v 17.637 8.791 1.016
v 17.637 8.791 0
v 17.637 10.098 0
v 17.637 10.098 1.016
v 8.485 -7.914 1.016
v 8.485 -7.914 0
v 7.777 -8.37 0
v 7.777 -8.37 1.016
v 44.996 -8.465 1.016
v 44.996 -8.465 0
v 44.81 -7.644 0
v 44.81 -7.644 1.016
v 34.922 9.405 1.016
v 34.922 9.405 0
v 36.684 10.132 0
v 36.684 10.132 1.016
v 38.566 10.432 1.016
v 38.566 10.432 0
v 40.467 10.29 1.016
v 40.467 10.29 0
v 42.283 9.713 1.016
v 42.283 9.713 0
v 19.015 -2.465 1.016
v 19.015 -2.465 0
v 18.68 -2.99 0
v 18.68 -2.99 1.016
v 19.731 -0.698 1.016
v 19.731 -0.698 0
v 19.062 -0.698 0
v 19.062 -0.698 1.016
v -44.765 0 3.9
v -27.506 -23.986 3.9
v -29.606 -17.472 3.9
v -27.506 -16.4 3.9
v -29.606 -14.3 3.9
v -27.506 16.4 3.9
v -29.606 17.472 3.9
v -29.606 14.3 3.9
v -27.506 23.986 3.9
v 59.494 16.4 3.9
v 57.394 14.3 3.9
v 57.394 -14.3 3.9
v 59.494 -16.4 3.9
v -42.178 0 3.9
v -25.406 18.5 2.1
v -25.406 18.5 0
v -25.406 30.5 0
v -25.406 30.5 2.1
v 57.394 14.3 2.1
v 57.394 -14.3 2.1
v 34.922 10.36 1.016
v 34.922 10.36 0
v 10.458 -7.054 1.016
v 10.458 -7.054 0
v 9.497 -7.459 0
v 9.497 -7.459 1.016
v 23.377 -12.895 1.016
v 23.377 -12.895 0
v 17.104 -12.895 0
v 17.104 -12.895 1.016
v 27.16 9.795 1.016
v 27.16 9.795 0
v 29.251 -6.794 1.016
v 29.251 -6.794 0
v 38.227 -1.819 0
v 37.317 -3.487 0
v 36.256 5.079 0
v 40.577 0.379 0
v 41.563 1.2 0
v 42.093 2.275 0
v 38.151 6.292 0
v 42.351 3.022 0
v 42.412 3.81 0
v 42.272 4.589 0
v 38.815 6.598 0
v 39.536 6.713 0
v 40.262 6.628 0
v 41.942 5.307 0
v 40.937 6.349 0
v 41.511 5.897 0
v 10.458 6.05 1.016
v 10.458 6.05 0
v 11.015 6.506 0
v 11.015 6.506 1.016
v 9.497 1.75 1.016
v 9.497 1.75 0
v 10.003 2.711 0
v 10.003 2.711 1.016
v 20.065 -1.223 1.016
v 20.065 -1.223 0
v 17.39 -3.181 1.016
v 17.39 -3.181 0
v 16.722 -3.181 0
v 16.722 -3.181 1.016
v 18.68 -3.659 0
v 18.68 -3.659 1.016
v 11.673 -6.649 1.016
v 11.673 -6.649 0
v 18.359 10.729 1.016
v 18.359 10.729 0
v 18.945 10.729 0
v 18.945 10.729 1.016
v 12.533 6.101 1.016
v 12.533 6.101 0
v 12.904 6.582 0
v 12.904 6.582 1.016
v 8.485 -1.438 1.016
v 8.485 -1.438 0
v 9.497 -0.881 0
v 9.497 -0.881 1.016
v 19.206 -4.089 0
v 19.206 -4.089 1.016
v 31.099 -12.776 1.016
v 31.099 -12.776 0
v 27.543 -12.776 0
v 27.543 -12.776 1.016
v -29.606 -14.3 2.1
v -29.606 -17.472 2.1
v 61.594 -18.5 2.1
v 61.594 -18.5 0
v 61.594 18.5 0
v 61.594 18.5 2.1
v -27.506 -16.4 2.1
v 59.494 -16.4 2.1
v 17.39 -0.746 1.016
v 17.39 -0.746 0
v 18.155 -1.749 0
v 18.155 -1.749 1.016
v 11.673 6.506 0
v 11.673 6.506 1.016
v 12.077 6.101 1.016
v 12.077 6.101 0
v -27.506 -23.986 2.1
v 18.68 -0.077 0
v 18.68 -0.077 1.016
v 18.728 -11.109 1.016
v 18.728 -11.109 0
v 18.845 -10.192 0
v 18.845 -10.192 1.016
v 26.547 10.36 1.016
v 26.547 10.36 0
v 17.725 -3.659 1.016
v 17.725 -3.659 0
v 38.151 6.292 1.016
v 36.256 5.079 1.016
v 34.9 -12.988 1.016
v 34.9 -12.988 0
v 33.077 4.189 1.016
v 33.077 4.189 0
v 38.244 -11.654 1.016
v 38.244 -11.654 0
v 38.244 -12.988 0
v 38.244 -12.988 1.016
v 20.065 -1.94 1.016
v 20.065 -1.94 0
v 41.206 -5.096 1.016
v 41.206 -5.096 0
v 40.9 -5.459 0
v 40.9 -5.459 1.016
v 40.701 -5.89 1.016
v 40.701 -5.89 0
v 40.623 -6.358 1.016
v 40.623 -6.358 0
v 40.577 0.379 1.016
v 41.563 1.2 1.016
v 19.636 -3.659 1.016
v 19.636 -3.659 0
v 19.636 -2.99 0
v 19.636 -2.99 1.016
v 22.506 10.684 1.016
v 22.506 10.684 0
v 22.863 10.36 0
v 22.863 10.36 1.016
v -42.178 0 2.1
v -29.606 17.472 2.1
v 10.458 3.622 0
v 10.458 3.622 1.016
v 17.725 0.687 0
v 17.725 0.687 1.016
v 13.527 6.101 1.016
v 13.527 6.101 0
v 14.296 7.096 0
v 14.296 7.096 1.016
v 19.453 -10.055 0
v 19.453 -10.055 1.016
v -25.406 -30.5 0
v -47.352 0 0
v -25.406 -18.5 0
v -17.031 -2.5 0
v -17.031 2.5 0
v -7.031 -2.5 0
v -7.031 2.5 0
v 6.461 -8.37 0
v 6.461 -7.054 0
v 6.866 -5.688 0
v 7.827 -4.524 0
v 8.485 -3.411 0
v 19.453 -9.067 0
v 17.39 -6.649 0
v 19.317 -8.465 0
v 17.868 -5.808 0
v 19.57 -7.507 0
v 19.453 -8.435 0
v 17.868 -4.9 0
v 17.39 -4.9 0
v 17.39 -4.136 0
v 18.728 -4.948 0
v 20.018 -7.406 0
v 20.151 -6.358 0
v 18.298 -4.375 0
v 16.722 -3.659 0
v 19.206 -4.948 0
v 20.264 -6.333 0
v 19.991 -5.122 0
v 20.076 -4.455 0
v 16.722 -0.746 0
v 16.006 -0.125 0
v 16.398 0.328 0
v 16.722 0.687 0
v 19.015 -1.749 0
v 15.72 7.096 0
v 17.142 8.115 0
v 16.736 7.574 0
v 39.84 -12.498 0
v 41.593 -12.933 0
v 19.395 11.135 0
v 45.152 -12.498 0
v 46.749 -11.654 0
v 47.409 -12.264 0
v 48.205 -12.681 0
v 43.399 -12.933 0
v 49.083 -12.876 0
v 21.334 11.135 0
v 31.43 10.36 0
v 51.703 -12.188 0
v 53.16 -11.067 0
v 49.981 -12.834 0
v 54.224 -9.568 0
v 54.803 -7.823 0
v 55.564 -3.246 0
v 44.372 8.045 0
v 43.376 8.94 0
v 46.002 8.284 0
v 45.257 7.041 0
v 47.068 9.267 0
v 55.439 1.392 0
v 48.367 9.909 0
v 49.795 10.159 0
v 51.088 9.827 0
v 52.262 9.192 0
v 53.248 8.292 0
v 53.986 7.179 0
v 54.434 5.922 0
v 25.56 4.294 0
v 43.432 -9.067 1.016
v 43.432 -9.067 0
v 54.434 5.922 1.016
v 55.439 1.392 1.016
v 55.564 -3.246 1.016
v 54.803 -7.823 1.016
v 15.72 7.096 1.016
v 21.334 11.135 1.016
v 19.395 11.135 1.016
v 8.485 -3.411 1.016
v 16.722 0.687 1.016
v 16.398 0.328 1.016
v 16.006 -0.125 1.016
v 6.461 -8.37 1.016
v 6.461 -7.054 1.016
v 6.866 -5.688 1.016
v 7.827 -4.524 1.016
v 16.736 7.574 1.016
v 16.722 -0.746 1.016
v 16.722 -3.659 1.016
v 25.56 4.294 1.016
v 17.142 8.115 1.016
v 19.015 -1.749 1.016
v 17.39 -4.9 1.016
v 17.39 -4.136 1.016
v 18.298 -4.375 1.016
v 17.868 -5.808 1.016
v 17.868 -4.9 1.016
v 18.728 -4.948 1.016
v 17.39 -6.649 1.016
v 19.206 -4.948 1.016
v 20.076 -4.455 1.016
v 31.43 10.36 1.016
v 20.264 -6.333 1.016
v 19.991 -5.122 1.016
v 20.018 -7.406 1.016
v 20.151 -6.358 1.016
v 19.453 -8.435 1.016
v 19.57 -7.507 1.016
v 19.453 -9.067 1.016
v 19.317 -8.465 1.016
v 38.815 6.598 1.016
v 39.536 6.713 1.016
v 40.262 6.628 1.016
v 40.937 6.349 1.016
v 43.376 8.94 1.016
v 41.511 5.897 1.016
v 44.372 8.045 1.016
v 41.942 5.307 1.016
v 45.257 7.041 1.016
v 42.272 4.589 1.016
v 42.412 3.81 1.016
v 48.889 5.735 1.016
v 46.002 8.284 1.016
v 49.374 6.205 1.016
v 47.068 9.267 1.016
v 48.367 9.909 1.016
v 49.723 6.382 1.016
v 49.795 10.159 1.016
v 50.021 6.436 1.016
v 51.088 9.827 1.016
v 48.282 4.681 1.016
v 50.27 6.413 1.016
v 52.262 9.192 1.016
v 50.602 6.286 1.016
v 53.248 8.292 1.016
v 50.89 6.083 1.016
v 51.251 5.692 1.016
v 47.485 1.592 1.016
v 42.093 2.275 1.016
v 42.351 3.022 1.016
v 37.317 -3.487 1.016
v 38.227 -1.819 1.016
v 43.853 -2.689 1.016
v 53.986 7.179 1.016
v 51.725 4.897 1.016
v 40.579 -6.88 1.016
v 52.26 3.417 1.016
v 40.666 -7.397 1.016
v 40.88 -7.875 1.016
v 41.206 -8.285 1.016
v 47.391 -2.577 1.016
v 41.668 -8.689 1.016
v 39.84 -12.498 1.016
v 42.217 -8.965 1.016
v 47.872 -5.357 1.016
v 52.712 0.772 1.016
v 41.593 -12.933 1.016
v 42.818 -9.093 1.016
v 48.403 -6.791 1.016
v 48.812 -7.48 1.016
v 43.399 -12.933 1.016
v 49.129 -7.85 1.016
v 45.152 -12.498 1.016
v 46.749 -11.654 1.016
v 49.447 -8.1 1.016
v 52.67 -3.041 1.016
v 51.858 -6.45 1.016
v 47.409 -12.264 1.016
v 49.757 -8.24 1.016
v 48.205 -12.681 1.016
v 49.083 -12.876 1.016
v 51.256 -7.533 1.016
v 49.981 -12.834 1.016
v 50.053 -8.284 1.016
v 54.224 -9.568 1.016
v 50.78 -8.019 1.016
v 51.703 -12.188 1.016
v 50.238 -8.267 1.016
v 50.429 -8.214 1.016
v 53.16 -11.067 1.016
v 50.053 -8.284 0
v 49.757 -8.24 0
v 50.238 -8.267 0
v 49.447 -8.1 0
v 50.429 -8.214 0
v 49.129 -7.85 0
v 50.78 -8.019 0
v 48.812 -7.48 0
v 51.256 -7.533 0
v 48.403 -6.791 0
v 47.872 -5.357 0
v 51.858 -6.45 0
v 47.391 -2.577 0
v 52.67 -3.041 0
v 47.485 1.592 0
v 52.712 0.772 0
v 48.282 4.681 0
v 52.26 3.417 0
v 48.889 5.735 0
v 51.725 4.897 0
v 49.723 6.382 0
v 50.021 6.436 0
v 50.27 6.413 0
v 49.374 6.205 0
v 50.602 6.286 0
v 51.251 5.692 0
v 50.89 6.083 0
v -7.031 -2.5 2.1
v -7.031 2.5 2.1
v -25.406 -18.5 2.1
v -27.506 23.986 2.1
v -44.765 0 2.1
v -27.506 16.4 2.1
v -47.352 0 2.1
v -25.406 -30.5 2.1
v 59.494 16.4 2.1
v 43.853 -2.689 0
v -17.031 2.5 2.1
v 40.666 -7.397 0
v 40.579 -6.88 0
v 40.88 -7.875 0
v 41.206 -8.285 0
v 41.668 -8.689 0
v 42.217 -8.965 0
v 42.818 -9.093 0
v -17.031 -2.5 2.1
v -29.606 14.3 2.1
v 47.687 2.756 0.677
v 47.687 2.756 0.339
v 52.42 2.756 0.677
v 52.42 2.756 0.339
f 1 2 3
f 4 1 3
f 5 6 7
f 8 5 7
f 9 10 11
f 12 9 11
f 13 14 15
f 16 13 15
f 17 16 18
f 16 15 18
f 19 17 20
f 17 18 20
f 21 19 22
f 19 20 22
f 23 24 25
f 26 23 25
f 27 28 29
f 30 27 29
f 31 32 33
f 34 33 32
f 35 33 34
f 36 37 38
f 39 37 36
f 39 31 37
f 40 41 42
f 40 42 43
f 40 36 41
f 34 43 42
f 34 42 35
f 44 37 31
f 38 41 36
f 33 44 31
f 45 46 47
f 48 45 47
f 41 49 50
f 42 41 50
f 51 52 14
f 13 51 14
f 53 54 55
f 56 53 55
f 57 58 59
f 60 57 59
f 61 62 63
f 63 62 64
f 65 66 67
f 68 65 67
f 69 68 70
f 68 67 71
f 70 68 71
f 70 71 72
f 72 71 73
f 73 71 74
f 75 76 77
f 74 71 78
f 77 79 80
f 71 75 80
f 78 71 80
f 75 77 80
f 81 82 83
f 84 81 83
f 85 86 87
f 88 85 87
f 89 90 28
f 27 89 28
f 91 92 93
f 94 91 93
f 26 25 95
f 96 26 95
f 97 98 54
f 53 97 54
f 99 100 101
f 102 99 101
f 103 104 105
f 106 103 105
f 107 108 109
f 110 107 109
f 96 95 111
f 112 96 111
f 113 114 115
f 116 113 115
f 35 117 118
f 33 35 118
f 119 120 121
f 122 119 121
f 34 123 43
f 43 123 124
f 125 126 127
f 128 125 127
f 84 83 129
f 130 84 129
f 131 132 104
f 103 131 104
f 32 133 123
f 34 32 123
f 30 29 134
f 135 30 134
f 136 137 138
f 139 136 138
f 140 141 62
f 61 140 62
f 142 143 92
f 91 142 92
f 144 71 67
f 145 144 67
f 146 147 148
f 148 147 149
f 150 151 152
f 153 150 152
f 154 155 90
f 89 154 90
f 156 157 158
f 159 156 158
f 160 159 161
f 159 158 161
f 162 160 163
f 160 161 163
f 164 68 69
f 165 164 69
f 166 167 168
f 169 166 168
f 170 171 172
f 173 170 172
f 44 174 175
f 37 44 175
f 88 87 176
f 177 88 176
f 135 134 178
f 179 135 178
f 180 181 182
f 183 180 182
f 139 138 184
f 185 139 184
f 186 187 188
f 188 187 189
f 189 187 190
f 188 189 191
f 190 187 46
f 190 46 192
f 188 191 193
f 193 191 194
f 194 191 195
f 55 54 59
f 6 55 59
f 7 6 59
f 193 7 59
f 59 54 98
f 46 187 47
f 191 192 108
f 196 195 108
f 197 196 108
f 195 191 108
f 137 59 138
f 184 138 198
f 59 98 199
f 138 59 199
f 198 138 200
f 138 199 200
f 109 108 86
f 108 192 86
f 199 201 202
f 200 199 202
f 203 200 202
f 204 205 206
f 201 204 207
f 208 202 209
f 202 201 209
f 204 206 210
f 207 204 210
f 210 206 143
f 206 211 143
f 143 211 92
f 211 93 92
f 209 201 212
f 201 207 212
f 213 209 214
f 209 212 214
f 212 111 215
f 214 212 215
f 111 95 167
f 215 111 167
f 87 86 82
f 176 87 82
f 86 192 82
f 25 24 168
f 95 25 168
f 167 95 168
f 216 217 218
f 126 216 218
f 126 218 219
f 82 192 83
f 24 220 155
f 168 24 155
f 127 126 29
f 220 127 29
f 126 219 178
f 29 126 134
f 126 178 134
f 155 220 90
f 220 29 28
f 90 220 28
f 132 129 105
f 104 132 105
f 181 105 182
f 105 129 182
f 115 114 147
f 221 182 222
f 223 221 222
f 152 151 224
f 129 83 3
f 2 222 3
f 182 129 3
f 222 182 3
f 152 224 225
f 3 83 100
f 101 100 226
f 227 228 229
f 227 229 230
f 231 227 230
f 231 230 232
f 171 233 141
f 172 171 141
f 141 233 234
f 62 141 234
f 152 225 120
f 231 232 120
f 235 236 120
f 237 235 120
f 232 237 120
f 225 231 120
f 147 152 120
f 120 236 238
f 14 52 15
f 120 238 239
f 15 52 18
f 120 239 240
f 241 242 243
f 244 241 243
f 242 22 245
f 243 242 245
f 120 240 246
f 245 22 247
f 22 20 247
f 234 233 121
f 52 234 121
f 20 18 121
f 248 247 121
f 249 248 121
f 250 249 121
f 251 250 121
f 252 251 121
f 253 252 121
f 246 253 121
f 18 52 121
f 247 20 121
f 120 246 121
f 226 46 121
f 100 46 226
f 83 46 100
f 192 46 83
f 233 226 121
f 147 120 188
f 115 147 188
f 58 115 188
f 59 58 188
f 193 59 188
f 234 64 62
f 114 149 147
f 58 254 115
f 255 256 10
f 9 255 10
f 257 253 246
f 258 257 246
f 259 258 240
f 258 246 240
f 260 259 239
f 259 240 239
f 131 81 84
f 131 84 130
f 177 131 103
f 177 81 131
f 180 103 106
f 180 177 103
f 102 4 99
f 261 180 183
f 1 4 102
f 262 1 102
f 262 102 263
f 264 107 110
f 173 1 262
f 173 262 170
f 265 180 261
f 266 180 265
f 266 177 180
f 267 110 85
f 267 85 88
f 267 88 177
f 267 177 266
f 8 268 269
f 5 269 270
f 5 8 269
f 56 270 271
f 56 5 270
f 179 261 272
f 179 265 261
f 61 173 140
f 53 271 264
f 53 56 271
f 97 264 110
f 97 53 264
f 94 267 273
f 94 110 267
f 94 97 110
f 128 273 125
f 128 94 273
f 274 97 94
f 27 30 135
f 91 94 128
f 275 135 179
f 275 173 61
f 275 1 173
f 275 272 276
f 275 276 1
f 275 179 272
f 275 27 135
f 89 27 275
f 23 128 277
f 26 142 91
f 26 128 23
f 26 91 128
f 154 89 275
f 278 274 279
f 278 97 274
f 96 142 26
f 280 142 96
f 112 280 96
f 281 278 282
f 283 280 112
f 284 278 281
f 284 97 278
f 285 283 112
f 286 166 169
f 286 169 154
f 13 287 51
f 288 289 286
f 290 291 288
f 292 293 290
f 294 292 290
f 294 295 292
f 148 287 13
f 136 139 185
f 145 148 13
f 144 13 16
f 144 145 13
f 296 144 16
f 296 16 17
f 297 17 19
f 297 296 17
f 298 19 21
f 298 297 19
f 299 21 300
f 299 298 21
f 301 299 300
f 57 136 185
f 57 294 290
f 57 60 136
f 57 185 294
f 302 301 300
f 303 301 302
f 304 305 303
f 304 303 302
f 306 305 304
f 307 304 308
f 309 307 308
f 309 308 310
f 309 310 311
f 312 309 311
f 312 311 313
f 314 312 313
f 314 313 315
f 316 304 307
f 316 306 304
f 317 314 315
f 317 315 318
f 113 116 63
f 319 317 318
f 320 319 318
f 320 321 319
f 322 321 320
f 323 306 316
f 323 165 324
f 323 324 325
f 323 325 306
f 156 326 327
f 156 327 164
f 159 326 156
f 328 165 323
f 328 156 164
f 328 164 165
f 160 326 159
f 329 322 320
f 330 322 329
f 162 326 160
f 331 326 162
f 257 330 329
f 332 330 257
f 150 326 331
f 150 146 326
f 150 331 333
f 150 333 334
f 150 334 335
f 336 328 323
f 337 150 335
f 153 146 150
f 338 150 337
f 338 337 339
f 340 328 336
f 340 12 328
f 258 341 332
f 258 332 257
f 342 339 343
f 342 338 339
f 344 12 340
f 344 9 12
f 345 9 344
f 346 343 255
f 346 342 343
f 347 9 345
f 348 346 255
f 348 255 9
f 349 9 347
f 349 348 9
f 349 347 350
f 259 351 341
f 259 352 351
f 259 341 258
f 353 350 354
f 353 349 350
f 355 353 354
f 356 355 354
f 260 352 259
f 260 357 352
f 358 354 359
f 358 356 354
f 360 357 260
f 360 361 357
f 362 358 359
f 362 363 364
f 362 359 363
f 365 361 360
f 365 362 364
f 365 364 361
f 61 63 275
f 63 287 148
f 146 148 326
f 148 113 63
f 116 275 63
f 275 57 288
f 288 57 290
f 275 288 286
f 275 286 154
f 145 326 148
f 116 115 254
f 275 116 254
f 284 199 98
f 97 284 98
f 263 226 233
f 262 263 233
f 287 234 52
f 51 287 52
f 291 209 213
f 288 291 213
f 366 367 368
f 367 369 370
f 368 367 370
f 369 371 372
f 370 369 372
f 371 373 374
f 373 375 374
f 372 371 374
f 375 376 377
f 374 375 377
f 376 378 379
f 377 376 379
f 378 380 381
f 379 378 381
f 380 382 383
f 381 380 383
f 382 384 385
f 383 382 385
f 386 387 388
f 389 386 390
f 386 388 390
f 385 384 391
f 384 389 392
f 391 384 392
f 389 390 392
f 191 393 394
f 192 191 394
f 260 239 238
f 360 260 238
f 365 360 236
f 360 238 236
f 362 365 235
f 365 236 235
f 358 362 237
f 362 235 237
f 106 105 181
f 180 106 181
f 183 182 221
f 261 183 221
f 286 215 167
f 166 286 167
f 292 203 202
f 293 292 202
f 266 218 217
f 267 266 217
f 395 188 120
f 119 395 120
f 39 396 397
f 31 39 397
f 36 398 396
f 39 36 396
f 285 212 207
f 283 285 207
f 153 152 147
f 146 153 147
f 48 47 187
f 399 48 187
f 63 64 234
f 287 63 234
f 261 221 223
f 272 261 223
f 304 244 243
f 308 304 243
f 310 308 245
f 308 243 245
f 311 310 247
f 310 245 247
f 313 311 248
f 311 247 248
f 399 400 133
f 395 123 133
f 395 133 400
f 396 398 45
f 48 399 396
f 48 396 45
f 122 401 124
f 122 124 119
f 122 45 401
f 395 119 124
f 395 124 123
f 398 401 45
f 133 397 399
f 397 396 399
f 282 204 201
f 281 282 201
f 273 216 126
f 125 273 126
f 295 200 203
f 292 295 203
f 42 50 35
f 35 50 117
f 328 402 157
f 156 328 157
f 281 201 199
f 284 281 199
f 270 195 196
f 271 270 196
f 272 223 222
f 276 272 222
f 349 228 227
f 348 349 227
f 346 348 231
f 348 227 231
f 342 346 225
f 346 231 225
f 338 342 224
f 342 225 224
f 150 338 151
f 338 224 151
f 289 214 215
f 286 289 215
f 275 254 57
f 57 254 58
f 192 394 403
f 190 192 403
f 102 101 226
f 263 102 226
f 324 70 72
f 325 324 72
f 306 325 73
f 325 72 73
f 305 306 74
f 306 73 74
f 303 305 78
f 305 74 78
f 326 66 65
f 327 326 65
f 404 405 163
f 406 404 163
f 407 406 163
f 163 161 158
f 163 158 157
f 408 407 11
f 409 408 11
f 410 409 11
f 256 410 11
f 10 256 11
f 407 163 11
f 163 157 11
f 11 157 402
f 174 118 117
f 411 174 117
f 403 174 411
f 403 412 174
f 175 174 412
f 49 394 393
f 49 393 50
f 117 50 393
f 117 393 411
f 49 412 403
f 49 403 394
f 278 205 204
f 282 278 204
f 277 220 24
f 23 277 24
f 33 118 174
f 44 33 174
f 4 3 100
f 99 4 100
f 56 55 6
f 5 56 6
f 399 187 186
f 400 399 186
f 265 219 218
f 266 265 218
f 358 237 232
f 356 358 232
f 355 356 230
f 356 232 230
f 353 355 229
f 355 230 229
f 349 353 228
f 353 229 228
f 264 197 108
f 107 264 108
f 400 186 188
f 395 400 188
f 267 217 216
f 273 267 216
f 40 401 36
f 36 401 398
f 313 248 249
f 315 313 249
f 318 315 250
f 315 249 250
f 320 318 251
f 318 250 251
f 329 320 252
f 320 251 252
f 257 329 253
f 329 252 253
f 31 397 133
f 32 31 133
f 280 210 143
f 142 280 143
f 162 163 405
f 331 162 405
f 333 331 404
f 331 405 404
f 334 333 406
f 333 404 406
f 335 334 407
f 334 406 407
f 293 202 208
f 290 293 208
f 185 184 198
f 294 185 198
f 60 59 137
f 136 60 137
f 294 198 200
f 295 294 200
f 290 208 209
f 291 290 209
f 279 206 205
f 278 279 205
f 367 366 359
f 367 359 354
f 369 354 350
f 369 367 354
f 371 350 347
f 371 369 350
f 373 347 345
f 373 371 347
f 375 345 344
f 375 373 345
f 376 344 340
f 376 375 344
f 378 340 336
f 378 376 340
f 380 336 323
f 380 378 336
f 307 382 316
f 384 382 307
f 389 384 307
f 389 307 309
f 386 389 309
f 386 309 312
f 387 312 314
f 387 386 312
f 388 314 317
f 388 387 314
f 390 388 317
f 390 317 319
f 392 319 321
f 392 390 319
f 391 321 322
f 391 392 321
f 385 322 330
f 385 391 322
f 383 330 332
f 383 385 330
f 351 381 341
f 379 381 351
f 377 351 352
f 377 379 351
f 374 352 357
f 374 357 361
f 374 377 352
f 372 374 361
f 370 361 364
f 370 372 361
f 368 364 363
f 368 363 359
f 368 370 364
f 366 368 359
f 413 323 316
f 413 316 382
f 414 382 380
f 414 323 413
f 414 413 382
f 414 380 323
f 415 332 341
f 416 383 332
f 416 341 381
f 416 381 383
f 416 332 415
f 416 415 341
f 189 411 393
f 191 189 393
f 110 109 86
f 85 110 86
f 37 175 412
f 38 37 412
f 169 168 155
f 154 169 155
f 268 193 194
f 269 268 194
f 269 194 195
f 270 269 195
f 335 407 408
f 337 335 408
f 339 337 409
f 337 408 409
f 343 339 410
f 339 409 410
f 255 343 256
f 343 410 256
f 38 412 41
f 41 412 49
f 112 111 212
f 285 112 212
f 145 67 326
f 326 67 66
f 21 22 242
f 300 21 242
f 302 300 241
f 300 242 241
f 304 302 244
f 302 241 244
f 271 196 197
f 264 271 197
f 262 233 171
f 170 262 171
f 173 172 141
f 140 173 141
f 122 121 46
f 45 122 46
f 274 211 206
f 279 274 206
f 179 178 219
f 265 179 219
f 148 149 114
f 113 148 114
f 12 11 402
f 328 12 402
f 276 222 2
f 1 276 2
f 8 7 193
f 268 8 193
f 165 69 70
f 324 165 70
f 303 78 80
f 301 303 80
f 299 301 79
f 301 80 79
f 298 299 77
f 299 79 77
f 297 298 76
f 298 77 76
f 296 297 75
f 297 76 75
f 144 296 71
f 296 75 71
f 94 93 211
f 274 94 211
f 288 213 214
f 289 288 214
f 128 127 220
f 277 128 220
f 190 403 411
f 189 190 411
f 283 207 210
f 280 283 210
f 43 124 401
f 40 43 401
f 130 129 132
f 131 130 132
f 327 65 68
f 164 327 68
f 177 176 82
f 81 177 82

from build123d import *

# Parameters (mm, degrees)
F1_DEPTH = 2.1
F3_DEPTH = 1.8
F5_DEPTH = 8
F7_DEPTH = 1.016


with BuildPart() as f1:
    # F0 (on Top) → F1 (new body)
    with BuildSketch(Plane.XY):
        Polygon((61.593626, -18.5), (61.593626, 18.5), (-25.406374, 18.5), (-25.406374, 30.5), (-47.352125, 0), (-25.406374, -30.5), (-25.406374, -18.5), align=None)
    extrude(amount=F1_DEPTH)

    # F2 (on face) → F3 (join)
    with BuildSketch(Plane.XY.offset(2.1)):
        Polygon((59.493628, 16.400002), (-27.506373, 16.400002), (-27.506373, 23.985889), (-44.765007, 0), (-27.506373, -23.985889), (-27.506373, -16.400002), (59.493628, -16.400002), align=None)
        Polygon((-29.606375, 17.471772), (-29.606375, 14.3), (57.393626, 14.3), (57.393626, -14.3), (-29.606375, -14.3), (-29.606375, -17.471772), (-42.177888, 0), align=None, mode=Mode.SUBTRACT)
    extrude(amount=F3_DEPTH)

    # F4 (on face) → F5 (cut)
    with BuildSketch(Plane.XY.offset(2.1)):
        Polygon((-7.031372, -2.5), (-7.031372, 0), (-7.031372, 2.5), (-17.031372, 2.5), (-17.031372, -2.5), align=None)
    extrude(amount=-F5_DEPTH, mode=Mode.SUBTRACT)

    # F6 (on face) → F7 (cut)
    with BuildSketch(Plane(origin=(0, 0, 0), x_dir=(1, 0, 0), z_dir=(0, 0, -1))):
        with BuildLine():
            Line((17.868375, 5.807877), (17.389968, 6.649467))
            Line((17.389968, 6.649467), (15.720274, 6.649467))
            Line((15.720274, 6.649467), (11.672532, 6.649467))
            Line((11.672532, 6.649467), (10.458209, 7.054241))
            Line((10.458209, 7.054241), (9.49687, 7.459016))
            Line((9.49687, 7.459016), (8.484934, 7.914387))
            Line((8.484934, 7.914387), (7.776579, 8.369757))
            Line((7.776579, 8.369757), (6.461063, 8.369757))
            Line((6.461063, 8.369757), (6.461063, 7.054241))
            Line((6.461063, 7.054241), (6.865838, 5.688129))
            Line((6.865838, 5.688129), (7.827176, 4.524403))
            Line((7.827176, 4.524403), (8.484934, 3.411273))
            Line((8.484934, 3.411273), (8.484934, 1.437999))
            Line((8.484934, 1.437999), (9.49687, 0.881434))
            Line((9.49687, 0.881434), (9.49687, -1.749598))
            Line((9.49687, -1.749598), (10.002838, -2.710937))
            Line((10.002838, -2.710937), (10.458209, -3.621679))
            Line((10.458209, -3.621679), (10.458209, -6.050324))
            Line((10.458209, -6.050324), (11.014773, -6.505695))
            Line((11.014773, -6.505695), (11.672532, -6.505695))
            Line((11.672532, -6.505695), (12.077306, -6.100921))
            Line((12.077306, -6.100921), (12.532677, -6.100921))
            Line((12.532677, -6.100921), (12.90433, -6.582127))
            Line((12.90433, -6.582127), (13.527384, -6.100921))
            Line((13.527384, -6.100921), (14.296271, -7.096457))
            Line((14.296271, -7.096457), (15.720274, -7.096457))
            Line((15.720274, -7.096457), (16.735842, -7.573813))
            Line((16.735842, -7.573813), (17.14153, -8.114732))
            Line((17.14153, -8.114732), (17.637373, -8.790881))
            Line((17.637373, -8.790881), (17.637373, -10.098103))
            Line((17.637373, -10.098103), (18.358599, -10.729175))
            Line((18.358599, -10.729175), (18.944595, -10.729175))
            Line((18.944595, -10.729175), (19.39536, -11.134865))
            Line((19.39536, -11.134865), (21.333655, -11.134865))
            Line((21.333655, -11.134865), (22.505646, -10.684098))
            Line((22.505646, -10.684098), (22.862506, -10.359681))
            Line((22.862506, -10.359681), (26.547044, -10.359681))
            Line((26.547044, -10.359681), (27.159763, -9.794501))
            Line((27.159763, -9.794501), (29.251238, 6.794227))
            Line((29.251238, 6.794227), (31.42953, -10.359681))
            Line((31.42953, -10.359681), (34.922162, -10.359681))
            Line((34.922162, -10.359681), (34.922162, -9.405373))
            ThreePointArc((34.922162, -9.405373), (38.566072, -10.431832), (42.282903, -9.712898))
            ThreePointArc((42.282903, -9.712898), (43.887119, -8.50738), (45.256817, -7.040849))
            ThreePointArc((45.256817, -7.040849), (47.068037, -9.266569), (49.795189, -10.159309))
            ThreePointArc((49.795189, -10.159309), (52.782739, -8.771872), (54.433858, -5.921566))
            ThreePointArc((54.433858, -5.921566), (55.612943, 0.923855), (54.802926, 7.822689))
            ThreePointArc((54.802926, 7.822689), (53.159635, 11.066769), (49.981279, 12.833834))
            ThreePointArc((49.981279, 12.833834), (48.205281, 12.681465), (46.748952, 11.653607))
            ThreePointArc((46.748952, 11.653607), (42.496265, 12.988448), (38.243578, 11.653607))
            Line((38.243578, 11.653607), (38.243578, 12.988448))
            Line((38.243578, 12.988448), (34.899586, 12.988448))
            Line((34.899586, 12.988448), (33.07669, -4.188973))
            Line((33.07669, -4.188973), (31.098974, 12.775832))
            Line((31.098974, 12.775832), (27.543157, 12.775832))
            Line((27.543157, 12.775832), (25.559743, -4.294449))
            Line((25.559743, -4.294449), (23.376931, 12.895053))
            Line((23.376931, 12.895053), (17.104378, 12.895053))
            Line((17.104378, 12.895053), (18.728114, 11.108903))
            Line((18.728114, 11.108903), (18.844541, 10.192047))
            Line((18.844541, 10.192047), (19.452574, 10.054762))
            Line((19.452574, 10.054762), (19.452574, 9.066838))
            Line((19.452574, 9.066838), (19.316775, 8.465384))
            Line((19.316775, 8.465384), (19.452574, 8.434722))
            Line((19.452574, 8.434722), (19.570415, 7.506735))
            Line((19.570415, 7.506735), (20.018297, 7.40561))
            Line((20.018297, 7.40561), (20.151291, 6.358286))
            Line((20.151291, 6.358286), (20.264299, 6.33277))
            Line((20.264299, 6.33277), (19.990926, 5.122006))
            Line((19.990926, 5.122006), (20.075682, 4.454563))
            Line((20.075682, 4.454563), (19.6355, 3.658812))
            Line((19.6355, 3.658812), (19.6355, 2.990214))
            Line((19.6355, 2.990214), (20.065341, 1.93956))
            Line((20.065341, 1.93956), (20.065341, 1.223204))
            Line((20.065341, 1.223204), (19.73102, 0.697878))
            Line((19.73102, 0.697878), (19.062379, 0.697878))
            Line((19.062379, 0.697878), (18.680296, 0.077037))
            Line((18.680296, 0.077037), (17.725095, -0.687076))
            Line((17.725095, -0.687076), (16.722131, -0.687076))
            Line((16.722131, -0.687076), (16.398085, -0.327953))
            Line((16.398085, -0.327953), (16.00573, 0.124794))
            Line((16.00573, 0.124794), (16.722131, 0.745635))
            Line((16.722131, 0.745635), (17.389968, 0.745635))
            Line((17.389968, 0.745635), (18.154935, 1.748532))
            Line((18.154935, 1.748532), (19.014617, 1.748532))
            Line((19.014617, 1.748532), (19.014617, 2.464886))
            Line((19.014617, 2.464886), (18.680296, 2.990214))
            Line((18.680296, 2.990214), (18.680296, 3.658812))
            Line((18.680296, 3.658812), (19.205659, 4.088624))
            Line((19.205659, 4.088624), (19.205659, 4.94825))
            Line((19.205659, 4.94825), (18.728056, 4.94825))
            Line((18.728056, 4.94825), (18.298216, 4.375167))
            Line((18.298216, 4.375167), (17.725095, 3.658812))
            Line((17.725095, 3.658812), (17.389968, 3.181241))
            Line((17.389968, 3.181241), (16.722131, 3.181241))
            Line((16.722131, 3.181241), (16.722131, 3.658812))
            Line((16.722131, 3.658812), (17.389968, 4.136382))
            Line((17.389968, 4.136382), (17.389968, 4.900494))
            Line((17.389968, 4.900494), (17.868375, 4.900494))
            Line((17.868375, 4.900494), (17.868375, 5.807877))
        make_face()
        with BuildLine():
            Line((36.25592, -5.079472), (37.317255, 3.487003))
            Line((37.317255, 3.487003), (38.226967, 1.819194))
            Line((38.226967, 1.819194), (40.577063, -0.379282))
            Line((40.577063, -0.379282), (41.562585, -1.199999))
            Line((41.562585, -1.199999), (42.093252, -2.27452))
            ThreePointArc((42.093252, -2.27452), (42.411611, -3.810418), (41.941633, -5.3069))
            ThreePointArc((41.941633, -5.3069), (40.261644, -6.627542), (38.151158, -6.292424))
            Line((38.151158, -6.292424), (36.25592, -5.079472))
        make_face(mode=Mode.SUBTRACT)
        with BuildLine():
            Line((43.431631, 9.066838), (44.995993, 8.465384))
            Line((44.995993, 8.465384), (44.810452, 7.643624))
            Line((44.810452, 7.643624), (43.853124, 2.68892))
            Line((43.853124, 2.68892), (41.205642, 5.095722))
            ThreePointArc((41.205642, 5.095722), (40.786126, 5.667855), (40.622921, 6.358286))
            ThreePointArc((40.622921, 6.358286), (40.666306, 7.396519), (41.205642, 8.284735))
            ThreePointArc((41.205642, 8.284735), (42.217155, 8.964619), (43.431631, 9.066838))
        make_face(mode=Mode.SUBTRACT)
        with BuildLine():
            add(Edge.make_bspline(
                [(50.053255, 8.283923), (45.320541, 8.283923), (47.686898, -2.756179), (50.053255, -13.79628), (52.419612, -2.756179), (54.78597, 8.283923), (50.053255, 8.283923)],
                knots=[0, 0, 0, 2.094395, 2.094395, 4.18879, 4.18879, 6.283185, 6.283185, 6.283185], degree=2, weights=[1, 0.5, 1, 0.5, 1, 0.5, 1]))
        make_face(mode=Mode.SUBTRACT)
    extrude(amount=-F7_DEPTH, mode=Mode.SUBTRACT)


solid = f1.part
